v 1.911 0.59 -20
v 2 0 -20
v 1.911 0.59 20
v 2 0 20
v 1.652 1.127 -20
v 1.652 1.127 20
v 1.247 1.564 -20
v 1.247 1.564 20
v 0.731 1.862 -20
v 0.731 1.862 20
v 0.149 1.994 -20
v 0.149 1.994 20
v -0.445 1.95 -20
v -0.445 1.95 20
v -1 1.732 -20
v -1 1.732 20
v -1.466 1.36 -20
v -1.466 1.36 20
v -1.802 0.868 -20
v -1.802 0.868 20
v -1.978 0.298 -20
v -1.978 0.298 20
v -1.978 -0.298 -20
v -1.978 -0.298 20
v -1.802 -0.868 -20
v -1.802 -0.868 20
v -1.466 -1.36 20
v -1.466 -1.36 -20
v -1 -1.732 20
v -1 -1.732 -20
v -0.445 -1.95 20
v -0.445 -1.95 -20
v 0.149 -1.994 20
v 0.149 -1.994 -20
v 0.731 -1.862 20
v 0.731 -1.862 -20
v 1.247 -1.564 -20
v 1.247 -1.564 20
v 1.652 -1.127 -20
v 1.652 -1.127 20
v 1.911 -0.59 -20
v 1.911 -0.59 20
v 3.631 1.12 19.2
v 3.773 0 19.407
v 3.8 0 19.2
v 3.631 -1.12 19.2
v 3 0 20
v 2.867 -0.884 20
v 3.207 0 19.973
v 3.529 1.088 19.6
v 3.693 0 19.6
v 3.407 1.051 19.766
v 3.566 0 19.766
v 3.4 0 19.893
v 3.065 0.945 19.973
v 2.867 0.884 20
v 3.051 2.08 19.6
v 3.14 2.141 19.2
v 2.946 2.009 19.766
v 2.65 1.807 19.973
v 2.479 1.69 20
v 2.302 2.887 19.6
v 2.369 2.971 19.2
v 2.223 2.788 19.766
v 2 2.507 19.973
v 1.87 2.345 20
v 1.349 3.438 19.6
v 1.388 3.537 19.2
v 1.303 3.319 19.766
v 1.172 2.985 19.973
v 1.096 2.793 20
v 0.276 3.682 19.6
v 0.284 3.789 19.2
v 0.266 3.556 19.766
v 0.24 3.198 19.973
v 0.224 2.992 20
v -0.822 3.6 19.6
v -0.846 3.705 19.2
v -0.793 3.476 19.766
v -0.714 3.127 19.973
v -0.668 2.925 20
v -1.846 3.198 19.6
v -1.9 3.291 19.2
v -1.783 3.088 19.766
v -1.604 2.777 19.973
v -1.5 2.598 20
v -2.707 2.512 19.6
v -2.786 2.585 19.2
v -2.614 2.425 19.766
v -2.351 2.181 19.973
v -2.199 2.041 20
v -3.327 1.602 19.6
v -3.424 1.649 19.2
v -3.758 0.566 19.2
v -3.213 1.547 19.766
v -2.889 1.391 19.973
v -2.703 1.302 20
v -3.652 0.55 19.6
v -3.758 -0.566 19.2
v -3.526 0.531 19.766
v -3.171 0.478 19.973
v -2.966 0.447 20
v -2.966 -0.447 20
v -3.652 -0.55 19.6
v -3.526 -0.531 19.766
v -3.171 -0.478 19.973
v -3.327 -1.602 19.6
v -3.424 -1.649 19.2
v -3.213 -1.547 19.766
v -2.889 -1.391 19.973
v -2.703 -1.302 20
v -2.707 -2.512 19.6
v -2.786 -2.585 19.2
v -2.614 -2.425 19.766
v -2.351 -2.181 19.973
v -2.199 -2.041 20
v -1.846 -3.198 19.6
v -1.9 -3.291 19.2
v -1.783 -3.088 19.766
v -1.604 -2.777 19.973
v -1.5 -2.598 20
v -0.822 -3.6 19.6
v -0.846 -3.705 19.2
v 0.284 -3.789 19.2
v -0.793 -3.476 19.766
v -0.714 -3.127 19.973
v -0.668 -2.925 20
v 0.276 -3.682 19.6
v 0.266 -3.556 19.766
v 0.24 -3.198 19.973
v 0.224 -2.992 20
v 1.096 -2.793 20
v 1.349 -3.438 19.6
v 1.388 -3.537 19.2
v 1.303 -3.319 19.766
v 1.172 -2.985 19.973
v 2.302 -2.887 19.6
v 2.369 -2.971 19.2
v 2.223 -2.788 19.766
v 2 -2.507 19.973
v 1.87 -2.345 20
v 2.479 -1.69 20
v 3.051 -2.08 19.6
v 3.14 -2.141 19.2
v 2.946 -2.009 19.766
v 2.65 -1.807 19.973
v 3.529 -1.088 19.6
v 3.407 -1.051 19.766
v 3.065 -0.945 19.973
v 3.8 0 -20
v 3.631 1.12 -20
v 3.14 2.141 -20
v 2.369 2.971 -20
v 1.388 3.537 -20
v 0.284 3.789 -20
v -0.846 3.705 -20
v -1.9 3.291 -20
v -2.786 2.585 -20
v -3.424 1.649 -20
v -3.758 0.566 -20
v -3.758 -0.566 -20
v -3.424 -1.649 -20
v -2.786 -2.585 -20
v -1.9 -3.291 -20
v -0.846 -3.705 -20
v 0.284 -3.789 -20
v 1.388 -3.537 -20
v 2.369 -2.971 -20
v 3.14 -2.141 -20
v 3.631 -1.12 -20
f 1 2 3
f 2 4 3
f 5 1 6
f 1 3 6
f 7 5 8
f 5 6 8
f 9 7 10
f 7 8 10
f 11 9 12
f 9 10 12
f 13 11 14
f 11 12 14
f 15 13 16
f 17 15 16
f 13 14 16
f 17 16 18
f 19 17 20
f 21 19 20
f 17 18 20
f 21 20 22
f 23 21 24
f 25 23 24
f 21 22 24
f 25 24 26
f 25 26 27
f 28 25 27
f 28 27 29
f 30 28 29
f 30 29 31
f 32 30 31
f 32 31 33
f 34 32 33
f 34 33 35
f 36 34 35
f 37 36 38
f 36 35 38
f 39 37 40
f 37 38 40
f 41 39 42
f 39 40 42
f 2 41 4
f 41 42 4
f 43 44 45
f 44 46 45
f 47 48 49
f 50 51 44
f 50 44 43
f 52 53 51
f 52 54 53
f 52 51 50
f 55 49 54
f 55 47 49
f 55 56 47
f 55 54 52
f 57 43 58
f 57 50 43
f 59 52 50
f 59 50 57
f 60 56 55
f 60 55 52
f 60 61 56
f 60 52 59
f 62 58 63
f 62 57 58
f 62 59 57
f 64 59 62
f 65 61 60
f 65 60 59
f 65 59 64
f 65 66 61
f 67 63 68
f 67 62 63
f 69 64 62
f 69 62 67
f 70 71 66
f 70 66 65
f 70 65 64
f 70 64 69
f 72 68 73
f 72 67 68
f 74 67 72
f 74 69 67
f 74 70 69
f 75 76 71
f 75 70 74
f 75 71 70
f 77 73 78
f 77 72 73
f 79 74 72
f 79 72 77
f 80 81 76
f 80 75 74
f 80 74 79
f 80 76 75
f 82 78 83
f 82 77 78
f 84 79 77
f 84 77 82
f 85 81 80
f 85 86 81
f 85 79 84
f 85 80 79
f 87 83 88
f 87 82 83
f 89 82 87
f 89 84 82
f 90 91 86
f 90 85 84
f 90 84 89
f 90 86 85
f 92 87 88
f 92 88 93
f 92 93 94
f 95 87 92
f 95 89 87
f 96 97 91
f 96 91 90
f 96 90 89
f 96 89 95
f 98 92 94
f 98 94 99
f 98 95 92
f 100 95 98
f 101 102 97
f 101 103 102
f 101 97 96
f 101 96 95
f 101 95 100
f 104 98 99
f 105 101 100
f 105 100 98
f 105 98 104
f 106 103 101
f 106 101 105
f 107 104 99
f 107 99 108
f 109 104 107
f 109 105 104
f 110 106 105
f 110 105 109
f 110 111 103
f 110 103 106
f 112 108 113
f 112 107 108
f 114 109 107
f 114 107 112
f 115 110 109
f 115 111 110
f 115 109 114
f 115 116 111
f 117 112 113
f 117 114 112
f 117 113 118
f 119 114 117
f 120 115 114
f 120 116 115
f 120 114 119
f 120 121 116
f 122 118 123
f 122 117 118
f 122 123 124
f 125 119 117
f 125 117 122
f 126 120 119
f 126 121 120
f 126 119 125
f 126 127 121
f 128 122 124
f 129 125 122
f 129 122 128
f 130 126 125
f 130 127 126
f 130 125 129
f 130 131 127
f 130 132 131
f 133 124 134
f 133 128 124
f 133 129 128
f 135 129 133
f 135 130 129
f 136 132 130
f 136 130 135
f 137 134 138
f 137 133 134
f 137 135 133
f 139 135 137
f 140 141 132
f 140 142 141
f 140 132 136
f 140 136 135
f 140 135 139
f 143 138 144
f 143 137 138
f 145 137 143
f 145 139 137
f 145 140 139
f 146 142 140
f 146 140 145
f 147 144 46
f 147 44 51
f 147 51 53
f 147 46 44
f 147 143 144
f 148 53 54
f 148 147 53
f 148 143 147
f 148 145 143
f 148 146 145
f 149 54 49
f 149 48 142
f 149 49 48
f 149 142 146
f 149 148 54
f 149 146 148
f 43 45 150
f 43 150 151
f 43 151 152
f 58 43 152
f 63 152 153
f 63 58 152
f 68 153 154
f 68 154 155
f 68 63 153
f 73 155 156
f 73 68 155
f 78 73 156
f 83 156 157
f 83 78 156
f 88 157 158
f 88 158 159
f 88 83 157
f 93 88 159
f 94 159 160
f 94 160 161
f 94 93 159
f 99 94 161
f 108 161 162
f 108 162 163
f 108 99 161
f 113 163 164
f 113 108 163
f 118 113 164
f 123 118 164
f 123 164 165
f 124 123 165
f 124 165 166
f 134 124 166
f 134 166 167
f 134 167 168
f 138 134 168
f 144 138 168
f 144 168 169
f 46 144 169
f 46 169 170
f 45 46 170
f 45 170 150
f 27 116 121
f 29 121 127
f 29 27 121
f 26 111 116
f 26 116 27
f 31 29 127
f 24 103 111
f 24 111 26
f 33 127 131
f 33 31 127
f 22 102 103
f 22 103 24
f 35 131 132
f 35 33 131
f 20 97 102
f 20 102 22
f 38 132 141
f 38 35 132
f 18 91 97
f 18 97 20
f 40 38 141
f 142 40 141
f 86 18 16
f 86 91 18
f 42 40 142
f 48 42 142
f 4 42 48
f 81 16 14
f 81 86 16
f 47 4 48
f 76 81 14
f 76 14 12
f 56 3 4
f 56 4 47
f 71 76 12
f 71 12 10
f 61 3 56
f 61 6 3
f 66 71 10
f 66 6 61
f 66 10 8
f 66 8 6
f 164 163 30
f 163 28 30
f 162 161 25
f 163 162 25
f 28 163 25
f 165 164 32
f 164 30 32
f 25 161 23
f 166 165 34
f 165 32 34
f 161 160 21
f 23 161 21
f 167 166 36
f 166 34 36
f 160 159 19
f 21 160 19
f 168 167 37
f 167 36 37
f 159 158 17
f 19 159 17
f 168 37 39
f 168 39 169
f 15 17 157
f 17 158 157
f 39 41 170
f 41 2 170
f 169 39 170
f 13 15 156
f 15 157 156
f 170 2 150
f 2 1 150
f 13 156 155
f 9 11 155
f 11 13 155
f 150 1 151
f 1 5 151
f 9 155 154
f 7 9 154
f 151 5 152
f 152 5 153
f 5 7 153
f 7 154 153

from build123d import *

# Parameters (mm, degrees)
SKETCH1_R               = 3.8
BOSS_EXTRUDE1_DEPTH     = 20
SKETCH2_R               = 2
CUT_EXTRUDE1_DEPTH      = 21
CUT_EXTRUDE1_DEPTH_BACK = 21
FILLET1_R               = 0.8


with BuildPart() as part:
    # Sketch1 → Boss-Extrude1 (new body, symmetric)
    with BuildSketch(Plane.XY):
        Circle(SKETCH1_R)
    extrude(amount=BOSS_EXTRUDE1_DEPTH, both=True)

    # Sketch2 → Cut-Extrude1 (cut, two sides)
    with BuildSketch(Plane.XY) as cut_extrude1_sk:
        Circle(SKETCH2_R)
    extrude(amount=CUT_EXTRUDE1_DEPTH, mode=Mode.SUBTRACT)
    extrude(cut_extrude1_sk.sketch, amount=-CUT_EXTRUDE1_DEPTH_BACK, mode=Mode.SUBTRACT)

    # Fillet1
    fillet1_edges = [part.edges().sort_by_distance(p)[0] for p in [
        (-3.8, 0, 20),
    ]]
    fillet(fillet1_edges, radius=FILLET1_R)


solid = part.part
